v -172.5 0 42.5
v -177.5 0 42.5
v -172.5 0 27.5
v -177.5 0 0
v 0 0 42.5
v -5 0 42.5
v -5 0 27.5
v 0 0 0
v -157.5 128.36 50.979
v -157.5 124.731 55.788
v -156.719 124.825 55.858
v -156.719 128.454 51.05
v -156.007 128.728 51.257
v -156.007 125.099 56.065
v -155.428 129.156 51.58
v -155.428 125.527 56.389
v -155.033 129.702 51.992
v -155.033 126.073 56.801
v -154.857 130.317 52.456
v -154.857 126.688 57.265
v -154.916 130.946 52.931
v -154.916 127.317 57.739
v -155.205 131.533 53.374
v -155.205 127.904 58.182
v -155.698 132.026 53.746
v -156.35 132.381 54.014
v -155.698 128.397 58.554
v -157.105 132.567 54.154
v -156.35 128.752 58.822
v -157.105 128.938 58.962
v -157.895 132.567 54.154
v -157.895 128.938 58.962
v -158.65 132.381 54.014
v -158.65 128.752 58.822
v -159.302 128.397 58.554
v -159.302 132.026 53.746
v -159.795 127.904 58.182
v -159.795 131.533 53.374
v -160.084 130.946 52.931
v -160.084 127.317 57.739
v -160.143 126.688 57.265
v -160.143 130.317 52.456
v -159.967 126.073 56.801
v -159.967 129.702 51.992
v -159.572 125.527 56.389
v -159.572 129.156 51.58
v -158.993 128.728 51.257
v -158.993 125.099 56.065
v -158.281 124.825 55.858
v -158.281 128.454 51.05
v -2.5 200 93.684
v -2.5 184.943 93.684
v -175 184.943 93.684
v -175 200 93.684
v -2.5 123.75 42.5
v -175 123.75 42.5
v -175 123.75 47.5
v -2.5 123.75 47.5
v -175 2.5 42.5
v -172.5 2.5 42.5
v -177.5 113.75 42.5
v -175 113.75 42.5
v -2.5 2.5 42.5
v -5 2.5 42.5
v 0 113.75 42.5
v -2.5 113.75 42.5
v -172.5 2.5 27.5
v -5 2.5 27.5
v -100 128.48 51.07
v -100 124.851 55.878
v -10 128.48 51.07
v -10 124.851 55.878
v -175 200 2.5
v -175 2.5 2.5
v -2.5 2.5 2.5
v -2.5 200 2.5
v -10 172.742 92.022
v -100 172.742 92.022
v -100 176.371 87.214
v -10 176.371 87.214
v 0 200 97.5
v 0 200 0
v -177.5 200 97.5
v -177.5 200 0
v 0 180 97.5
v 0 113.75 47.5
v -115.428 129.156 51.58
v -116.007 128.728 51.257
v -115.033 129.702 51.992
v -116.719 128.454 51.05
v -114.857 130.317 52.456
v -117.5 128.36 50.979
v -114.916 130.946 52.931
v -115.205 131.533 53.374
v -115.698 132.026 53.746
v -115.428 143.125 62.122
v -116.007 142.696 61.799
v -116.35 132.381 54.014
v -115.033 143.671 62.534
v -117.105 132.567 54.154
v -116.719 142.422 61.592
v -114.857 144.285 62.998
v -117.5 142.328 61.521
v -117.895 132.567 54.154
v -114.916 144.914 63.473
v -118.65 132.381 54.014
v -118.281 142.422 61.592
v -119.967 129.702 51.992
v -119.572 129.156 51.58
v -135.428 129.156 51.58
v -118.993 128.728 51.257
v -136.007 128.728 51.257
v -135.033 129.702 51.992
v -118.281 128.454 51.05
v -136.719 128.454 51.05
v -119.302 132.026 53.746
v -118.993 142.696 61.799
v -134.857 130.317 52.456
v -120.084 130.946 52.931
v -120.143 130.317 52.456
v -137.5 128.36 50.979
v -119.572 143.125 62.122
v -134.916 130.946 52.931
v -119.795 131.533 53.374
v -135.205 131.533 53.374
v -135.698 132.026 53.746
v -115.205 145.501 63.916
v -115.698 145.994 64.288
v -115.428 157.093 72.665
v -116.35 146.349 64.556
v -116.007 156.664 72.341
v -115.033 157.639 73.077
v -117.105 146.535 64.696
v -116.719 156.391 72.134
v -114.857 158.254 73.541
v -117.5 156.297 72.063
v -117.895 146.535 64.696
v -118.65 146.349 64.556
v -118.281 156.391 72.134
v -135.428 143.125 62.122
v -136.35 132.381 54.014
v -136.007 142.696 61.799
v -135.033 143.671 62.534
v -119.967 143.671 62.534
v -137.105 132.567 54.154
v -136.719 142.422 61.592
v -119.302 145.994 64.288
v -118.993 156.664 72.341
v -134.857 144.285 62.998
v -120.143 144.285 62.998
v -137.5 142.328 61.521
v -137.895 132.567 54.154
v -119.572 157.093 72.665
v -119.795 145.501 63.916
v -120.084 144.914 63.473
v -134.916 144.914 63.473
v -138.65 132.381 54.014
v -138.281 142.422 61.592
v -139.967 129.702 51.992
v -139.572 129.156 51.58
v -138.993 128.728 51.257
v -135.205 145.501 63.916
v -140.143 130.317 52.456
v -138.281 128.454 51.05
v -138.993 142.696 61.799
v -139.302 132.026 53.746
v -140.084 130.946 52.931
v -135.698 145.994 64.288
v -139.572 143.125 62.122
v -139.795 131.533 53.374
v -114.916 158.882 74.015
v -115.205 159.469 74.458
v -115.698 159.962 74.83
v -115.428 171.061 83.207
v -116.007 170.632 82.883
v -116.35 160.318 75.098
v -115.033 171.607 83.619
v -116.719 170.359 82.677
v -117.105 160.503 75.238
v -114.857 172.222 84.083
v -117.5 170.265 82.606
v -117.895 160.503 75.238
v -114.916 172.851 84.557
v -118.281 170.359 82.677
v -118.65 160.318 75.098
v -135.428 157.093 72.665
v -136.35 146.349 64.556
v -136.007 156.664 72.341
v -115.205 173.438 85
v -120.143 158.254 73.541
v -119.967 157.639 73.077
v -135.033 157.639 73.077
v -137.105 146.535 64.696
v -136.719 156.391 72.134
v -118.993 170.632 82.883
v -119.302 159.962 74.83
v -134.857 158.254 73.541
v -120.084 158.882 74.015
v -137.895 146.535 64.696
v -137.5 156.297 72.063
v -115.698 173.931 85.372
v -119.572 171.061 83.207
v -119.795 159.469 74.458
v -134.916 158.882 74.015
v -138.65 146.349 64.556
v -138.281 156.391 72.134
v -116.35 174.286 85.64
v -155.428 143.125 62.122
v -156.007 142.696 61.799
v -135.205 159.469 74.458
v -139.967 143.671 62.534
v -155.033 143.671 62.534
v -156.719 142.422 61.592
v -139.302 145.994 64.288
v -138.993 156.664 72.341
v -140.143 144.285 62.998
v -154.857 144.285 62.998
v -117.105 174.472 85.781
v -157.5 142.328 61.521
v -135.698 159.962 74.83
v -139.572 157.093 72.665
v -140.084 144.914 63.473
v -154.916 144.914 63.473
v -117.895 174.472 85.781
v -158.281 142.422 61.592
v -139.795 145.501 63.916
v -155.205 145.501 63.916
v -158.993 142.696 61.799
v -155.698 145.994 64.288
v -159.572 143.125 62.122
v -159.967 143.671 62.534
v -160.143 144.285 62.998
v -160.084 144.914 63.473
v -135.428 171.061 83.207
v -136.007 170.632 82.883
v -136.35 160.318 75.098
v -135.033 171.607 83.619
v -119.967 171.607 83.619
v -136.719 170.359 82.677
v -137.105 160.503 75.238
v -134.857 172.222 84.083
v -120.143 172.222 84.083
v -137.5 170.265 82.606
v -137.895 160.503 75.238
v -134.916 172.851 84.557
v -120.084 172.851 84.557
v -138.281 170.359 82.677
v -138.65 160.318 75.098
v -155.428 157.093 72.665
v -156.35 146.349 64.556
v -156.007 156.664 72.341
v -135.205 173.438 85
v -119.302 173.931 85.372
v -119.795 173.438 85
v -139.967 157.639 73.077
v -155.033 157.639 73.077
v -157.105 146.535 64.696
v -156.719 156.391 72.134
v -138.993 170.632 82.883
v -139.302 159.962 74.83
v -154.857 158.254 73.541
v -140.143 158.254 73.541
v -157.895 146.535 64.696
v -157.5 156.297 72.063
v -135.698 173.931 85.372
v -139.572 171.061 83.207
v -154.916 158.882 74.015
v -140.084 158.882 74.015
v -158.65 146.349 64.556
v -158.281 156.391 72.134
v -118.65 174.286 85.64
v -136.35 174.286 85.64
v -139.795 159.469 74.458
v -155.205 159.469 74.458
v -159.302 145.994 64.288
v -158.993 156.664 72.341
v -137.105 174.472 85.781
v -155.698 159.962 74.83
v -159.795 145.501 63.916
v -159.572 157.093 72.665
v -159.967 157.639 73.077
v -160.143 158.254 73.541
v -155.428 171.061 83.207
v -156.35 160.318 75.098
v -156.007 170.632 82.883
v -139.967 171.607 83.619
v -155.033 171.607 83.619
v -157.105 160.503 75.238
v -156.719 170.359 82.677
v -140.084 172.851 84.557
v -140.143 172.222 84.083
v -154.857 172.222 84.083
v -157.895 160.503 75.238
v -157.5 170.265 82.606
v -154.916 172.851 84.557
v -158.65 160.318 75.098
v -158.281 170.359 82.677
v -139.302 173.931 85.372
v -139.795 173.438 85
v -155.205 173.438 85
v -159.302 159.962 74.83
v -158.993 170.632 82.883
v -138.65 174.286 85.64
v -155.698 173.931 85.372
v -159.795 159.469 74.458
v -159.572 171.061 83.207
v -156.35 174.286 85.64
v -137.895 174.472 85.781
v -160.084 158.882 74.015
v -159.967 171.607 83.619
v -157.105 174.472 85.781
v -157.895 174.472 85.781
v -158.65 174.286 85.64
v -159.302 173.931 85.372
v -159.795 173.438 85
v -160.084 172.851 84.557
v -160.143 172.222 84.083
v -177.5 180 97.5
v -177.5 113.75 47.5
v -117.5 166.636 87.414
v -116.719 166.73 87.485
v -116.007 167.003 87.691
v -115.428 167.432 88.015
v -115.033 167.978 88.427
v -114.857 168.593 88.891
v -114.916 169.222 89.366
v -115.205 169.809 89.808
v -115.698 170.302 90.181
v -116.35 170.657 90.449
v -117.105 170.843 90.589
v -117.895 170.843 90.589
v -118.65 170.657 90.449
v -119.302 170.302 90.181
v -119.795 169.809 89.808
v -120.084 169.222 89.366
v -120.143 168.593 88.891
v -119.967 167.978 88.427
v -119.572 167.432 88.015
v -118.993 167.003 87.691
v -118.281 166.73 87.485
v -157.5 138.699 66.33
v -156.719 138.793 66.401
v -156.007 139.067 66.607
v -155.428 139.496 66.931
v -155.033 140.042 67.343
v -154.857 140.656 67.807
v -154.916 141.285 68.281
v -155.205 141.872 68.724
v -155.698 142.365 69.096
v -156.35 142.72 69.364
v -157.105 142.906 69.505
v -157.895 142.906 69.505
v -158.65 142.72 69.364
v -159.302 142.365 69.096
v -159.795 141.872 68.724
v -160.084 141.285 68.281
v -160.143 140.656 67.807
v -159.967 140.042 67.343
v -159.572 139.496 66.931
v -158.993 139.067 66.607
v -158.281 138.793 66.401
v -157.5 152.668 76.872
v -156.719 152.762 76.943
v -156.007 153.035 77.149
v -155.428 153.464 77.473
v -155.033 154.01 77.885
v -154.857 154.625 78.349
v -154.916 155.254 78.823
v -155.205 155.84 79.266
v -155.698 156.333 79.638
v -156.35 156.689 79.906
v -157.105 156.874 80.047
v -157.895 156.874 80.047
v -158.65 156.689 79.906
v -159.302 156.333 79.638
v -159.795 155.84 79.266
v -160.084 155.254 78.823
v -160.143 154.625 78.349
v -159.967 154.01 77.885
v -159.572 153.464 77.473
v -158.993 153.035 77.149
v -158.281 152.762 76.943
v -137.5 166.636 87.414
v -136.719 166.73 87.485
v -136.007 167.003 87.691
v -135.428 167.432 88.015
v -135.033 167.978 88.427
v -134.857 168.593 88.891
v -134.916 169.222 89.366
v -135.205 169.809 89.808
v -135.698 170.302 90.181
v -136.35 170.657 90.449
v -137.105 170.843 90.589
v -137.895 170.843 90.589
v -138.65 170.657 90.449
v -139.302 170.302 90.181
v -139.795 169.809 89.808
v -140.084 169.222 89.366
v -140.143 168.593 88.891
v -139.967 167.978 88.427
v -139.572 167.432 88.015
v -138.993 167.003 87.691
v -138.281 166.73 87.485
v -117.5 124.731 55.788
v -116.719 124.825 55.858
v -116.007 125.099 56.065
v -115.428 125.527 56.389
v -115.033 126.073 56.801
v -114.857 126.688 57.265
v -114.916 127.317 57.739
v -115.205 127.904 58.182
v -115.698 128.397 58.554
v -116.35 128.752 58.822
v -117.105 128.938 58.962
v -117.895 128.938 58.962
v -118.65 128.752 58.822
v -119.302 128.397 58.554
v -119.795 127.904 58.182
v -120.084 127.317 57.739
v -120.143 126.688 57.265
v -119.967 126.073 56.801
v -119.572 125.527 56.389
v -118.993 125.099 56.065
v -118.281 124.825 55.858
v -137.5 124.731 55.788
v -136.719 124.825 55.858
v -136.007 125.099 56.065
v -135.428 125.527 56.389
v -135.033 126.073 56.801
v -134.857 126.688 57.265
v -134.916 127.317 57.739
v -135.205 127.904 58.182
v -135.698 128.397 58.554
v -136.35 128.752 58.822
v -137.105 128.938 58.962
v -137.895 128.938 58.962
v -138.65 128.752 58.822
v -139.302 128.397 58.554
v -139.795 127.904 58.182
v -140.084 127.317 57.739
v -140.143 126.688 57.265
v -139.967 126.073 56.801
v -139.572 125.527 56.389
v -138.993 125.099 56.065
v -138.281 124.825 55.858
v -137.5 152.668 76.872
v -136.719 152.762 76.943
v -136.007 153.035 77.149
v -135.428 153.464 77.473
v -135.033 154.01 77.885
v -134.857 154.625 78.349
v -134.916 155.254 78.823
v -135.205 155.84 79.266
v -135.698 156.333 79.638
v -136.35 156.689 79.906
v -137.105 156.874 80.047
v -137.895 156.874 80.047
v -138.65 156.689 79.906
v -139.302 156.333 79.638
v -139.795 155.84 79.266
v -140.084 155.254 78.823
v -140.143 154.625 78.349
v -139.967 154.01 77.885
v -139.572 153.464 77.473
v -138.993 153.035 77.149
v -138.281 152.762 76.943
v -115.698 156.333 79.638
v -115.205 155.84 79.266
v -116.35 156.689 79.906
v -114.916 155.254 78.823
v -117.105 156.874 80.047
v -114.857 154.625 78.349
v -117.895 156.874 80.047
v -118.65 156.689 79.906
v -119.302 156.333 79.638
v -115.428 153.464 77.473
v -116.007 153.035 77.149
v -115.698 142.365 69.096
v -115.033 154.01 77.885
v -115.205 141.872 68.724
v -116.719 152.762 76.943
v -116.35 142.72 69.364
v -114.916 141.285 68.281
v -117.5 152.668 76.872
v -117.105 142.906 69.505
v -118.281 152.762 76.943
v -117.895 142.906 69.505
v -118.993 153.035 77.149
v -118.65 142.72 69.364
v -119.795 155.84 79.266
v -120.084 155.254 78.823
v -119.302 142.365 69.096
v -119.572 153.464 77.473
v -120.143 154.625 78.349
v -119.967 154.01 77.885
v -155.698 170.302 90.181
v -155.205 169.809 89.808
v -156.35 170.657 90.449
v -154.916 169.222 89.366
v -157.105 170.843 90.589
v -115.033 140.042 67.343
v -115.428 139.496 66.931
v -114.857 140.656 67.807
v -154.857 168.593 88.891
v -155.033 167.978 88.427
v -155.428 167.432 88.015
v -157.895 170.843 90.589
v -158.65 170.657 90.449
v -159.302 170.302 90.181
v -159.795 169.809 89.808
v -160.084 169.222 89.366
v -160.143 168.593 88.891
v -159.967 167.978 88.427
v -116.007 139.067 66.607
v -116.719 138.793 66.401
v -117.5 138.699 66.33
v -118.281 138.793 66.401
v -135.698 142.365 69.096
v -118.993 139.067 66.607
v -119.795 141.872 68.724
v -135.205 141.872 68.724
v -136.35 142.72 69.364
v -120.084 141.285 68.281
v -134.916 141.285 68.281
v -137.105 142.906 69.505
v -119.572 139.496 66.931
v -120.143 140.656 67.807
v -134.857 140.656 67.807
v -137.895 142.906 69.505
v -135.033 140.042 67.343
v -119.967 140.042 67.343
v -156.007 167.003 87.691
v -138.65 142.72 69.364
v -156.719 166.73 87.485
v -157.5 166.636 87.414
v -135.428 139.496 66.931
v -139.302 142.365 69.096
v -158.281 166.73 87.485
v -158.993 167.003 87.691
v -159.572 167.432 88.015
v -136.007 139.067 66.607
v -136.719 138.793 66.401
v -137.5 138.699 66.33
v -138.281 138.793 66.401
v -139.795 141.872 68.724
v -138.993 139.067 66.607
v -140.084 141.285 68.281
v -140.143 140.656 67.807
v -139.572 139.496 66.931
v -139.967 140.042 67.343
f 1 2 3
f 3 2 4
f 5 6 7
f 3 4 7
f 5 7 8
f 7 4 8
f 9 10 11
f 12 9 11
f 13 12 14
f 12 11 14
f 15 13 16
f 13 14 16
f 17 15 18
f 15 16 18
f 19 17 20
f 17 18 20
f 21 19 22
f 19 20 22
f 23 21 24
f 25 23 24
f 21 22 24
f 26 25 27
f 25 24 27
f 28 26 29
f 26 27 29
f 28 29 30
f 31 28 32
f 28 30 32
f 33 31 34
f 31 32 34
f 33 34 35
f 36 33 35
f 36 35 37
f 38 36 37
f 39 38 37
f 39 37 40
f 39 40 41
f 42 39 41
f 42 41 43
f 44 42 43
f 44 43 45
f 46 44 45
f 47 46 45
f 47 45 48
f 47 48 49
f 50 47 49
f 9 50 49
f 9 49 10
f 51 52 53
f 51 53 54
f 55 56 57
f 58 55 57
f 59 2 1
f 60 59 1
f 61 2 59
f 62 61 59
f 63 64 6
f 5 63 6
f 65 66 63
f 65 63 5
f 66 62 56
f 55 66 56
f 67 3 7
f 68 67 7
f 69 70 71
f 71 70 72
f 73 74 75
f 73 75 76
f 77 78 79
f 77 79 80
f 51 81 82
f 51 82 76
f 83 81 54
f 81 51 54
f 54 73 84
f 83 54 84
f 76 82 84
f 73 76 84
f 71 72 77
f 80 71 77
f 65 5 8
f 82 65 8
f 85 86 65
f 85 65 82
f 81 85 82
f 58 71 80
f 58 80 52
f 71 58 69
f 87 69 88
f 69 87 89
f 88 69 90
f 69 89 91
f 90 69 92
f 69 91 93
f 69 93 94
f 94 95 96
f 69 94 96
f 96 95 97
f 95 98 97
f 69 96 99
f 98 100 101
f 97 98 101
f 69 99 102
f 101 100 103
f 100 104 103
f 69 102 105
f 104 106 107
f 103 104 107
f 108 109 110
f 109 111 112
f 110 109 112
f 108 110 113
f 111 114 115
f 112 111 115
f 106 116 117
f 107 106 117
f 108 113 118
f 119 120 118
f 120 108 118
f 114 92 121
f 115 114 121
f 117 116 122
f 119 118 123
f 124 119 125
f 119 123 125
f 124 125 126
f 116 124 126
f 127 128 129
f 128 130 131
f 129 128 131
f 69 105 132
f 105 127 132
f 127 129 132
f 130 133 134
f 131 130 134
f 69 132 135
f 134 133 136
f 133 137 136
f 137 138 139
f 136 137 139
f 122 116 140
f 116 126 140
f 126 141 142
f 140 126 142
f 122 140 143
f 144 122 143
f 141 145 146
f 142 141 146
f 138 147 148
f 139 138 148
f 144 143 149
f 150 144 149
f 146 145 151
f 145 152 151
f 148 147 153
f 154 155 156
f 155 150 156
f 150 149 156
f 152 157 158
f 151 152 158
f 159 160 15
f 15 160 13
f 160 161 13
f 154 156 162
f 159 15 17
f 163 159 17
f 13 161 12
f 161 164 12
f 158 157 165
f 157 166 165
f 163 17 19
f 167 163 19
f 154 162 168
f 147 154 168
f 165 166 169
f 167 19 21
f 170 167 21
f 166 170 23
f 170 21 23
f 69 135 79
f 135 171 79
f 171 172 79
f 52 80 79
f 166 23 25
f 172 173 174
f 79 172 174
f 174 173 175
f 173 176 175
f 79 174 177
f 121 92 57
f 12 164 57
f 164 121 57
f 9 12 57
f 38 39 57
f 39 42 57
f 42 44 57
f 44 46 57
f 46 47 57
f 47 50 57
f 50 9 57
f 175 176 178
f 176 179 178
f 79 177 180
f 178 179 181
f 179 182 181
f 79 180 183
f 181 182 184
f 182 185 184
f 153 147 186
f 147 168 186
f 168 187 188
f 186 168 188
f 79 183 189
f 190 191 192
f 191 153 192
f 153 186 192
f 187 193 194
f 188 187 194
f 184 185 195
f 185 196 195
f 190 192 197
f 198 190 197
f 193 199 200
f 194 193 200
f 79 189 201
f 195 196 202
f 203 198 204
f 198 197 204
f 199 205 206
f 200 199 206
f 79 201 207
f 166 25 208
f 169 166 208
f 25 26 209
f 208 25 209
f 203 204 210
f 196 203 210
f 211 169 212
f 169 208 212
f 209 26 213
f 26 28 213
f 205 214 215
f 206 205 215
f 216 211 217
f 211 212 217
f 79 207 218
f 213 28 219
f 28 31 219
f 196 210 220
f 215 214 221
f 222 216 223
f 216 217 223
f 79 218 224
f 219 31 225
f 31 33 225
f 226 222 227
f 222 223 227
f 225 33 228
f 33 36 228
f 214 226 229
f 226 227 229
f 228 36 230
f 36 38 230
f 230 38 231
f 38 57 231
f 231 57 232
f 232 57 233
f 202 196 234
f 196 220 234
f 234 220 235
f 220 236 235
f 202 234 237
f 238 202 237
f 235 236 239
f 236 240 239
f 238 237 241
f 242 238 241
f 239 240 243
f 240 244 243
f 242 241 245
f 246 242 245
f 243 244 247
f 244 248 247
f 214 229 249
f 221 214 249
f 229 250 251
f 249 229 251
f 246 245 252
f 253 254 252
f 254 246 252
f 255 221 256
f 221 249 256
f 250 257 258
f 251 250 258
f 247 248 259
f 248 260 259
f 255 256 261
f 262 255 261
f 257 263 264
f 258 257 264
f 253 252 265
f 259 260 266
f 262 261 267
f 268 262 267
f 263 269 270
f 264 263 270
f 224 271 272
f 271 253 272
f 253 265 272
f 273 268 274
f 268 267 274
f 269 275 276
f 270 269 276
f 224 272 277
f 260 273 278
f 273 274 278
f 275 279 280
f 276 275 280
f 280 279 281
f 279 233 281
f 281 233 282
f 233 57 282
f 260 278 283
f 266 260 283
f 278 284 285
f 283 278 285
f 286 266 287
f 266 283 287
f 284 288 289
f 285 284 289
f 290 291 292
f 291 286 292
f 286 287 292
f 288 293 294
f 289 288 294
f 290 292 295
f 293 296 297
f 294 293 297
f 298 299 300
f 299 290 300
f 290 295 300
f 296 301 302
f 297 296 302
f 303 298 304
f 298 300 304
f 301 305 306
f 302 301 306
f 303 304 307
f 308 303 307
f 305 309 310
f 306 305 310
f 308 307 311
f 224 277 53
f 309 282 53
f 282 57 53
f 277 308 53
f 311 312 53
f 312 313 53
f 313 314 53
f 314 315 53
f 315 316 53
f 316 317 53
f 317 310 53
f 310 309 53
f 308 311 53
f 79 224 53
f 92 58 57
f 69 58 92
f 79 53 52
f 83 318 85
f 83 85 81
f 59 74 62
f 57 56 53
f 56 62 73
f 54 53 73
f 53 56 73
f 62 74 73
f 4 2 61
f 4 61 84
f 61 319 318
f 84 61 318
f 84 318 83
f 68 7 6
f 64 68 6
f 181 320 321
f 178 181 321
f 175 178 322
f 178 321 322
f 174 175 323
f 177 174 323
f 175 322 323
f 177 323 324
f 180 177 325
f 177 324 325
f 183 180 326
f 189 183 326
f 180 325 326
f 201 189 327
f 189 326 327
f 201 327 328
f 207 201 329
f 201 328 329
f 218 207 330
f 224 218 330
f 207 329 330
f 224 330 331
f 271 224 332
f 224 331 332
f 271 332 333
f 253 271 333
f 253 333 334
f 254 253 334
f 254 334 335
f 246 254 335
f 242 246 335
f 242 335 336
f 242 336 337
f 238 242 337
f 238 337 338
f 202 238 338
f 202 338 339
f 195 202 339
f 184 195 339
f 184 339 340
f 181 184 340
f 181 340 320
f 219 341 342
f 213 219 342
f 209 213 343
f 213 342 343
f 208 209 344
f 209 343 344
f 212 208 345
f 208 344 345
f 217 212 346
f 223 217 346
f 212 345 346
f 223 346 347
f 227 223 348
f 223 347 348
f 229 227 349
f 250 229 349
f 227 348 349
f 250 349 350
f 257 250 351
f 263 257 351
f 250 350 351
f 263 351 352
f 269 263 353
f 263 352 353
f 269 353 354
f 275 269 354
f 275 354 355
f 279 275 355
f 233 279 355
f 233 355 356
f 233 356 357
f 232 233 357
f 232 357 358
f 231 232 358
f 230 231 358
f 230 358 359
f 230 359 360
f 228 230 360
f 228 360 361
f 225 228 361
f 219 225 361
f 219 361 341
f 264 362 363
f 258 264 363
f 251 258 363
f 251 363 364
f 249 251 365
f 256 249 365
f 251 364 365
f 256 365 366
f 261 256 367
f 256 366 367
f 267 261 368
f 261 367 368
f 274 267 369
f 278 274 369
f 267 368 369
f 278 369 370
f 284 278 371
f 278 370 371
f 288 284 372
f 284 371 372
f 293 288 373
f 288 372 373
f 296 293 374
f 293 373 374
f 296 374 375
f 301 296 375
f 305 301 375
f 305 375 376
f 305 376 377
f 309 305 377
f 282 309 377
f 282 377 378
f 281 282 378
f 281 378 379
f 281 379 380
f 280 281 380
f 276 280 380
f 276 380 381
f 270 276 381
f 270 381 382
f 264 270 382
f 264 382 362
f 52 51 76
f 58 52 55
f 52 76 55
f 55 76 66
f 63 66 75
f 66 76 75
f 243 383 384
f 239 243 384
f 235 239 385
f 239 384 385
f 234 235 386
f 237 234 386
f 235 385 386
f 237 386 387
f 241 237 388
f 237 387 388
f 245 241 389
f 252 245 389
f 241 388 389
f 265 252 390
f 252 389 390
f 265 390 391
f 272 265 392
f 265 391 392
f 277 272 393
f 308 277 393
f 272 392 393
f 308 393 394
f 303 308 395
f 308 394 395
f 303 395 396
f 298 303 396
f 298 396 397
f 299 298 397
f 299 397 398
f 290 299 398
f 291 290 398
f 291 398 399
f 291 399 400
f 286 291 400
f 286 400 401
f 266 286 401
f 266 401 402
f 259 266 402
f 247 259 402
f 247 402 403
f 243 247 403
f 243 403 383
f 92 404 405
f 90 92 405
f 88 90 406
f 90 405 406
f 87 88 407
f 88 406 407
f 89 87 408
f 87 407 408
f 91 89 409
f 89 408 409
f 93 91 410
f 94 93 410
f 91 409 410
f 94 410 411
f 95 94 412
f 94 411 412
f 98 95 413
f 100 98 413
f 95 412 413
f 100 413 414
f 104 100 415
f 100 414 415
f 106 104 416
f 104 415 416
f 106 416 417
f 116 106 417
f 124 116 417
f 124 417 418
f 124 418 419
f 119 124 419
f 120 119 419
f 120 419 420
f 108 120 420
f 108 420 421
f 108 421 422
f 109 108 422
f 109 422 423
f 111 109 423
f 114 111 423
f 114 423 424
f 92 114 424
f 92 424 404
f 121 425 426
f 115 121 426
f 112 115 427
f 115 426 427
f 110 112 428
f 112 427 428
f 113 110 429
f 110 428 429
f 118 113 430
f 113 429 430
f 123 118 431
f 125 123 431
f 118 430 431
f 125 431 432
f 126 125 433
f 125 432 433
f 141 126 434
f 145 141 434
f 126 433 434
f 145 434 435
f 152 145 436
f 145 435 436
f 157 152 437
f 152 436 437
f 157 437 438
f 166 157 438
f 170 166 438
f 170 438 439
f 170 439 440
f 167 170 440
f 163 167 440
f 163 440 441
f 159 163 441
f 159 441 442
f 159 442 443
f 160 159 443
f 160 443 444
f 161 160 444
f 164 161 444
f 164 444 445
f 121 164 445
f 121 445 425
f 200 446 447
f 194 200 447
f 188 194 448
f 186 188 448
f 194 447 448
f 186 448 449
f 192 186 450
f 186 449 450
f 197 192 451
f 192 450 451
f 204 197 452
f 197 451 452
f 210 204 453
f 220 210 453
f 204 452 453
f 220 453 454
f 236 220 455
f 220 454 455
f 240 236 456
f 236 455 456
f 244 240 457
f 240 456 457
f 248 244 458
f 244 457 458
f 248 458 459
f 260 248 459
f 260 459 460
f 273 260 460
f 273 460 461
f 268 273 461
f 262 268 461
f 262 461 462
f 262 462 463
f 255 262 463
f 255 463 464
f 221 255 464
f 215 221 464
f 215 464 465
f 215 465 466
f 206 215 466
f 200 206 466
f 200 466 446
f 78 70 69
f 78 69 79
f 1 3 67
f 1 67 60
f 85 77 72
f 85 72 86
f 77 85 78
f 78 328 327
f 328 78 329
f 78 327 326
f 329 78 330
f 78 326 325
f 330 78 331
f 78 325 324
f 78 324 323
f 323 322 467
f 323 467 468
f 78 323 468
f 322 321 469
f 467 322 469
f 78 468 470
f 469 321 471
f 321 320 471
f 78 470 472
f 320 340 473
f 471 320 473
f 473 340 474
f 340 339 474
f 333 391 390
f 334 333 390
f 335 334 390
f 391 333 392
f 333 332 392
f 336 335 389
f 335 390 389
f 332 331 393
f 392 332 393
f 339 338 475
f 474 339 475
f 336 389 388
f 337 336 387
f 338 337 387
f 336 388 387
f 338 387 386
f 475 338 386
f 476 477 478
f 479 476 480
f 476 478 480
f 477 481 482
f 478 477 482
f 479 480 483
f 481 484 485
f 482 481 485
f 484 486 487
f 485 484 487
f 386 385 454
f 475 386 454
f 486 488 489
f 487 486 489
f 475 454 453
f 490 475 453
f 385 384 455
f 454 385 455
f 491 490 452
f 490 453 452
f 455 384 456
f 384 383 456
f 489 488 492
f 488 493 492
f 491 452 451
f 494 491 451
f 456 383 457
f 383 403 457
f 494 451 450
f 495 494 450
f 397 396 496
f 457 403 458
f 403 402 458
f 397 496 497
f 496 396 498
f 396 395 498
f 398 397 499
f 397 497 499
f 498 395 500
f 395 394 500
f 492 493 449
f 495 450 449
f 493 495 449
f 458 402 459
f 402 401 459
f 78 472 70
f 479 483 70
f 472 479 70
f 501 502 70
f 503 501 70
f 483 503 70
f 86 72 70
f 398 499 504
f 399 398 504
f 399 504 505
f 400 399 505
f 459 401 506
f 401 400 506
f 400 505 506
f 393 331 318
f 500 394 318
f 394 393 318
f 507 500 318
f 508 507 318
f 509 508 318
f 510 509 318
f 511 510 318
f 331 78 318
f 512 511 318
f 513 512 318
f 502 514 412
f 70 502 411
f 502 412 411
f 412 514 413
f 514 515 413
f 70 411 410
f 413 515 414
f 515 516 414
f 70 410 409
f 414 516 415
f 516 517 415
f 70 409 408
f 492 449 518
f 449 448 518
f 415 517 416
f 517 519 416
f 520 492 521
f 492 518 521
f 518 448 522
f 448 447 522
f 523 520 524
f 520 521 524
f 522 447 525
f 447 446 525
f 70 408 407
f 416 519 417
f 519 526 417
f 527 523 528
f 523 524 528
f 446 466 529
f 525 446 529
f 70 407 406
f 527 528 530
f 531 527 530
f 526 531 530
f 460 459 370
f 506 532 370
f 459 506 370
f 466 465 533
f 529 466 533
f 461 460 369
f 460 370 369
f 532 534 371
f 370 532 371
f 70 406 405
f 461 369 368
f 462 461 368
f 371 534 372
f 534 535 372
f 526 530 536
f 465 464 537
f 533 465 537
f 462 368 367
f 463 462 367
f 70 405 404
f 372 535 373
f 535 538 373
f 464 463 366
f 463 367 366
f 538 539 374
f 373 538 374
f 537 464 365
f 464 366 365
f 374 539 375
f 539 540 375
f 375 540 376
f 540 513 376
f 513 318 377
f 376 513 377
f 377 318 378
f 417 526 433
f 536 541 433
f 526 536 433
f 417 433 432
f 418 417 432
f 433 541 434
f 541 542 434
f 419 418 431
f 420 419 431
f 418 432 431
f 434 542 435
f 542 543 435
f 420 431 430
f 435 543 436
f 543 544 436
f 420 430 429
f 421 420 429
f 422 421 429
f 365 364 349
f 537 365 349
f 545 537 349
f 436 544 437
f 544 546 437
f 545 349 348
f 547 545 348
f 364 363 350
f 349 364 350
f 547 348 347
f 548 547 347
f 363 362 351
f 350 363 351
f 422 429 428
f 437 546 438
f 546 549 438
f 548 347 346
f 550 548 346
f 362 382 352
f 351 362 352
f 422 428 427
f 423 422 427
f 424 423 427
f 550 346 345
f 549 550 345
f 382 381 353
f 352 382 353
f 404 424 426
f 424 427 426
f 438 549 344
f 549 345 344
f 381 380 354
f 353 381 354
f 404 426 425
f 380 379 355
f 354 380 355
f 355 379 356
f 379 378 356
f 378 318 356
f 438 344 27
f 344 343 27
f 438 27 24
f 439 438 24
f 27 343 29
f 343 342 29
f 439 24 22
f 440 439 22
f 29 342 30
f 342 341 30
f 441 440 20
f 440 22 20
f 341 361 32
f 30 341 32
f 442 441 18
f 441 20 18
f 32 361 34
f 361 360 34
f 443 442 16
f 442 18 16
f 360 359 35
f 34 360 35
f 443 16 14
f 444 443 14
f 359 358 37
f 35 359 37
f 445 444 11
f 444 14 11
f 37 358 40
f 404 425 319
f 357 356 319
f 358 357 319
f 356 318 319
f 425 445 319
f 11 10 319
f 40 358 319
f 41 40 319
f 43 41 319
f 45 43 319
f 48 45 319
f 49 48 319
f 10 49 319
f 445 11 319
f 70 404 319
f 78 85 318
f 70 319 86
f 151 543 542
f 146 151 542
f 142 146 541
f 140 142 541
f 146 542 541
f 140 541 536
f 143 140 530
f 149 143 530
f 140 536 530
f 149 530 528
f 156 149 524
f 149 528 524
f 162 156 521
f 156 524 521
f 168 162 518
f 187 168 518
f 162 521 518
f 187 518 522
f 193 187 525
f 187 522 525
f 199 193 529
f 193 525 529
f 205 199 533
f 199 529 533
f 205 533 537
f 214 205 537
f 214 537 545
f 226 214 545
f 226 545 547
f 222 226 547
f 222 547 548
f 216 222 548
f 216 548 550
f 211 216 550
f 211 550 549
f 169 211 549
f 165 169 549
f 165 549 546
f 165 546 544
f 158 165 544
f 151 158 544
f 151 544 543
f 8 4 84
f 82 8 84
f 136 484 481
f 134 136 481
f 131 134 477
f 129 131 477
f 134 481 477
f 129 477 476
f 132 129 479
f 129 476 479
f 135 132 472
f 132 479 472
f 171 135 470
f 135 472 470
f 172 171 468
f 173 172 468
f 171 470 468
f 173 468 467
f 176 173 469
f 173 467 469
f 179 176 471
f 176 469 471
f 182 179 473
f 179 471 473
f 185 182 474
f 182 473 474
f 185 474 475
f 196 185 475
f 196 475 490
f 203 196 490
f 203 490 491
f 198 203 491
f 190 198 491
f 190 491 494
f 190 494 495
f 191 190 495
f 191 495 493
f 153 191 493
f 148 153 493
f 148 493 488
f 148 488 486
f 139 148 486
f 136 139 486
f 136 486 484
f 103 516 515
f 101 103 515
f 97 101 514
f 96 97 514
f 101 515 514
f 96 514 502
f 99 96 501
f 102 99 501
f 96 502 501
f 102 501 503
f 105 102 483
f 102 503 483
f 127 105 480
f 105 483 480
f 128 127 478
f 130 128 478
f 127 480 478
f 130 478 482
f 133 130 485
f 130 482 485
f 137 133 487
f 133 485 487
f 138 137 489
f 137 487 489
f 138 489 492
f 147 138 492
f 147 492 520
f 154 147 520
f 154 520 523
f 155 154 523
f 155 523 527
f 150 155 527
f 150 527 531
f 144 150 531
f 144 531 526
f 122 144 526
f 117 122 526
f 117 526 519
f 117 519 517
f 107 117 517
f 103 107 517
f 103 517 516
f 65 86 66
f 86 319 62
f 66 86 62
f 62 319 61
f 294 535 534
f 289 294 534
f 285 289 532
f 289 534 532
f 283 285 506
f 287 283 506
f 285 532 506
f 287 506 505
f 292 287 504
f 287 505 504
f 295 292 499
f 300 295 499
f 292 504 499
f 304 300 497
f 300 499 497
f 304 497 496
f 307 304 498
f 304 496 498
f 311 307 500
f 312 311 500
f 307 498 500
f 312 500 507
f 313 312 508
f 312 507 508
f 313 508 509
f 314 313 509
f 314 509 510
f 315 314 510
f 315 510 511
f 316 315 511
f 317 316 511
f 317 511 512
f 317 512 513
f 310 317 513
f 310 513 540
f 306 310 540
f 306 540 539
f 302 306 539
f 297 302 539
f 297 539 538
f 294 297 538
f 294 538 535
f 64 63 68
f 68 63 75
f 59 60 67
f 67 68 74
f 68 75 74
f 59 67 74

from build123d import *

# Parameters (mm, degrees)
SKETCH1_W                 = 200
SKETCH1_H                 = 177.5
BOSS_EXTRUDE1_DEPTH       = 2.5
BOSS_EXTRUDE2_DEPTH       = 40
SKETCH5_W                 = 86.25
SKETCH5_H                 = 95
BOSS_EXTRUDE3_DEPTH       = 2.5
CUT_EXTRUDE1_DEPTH        = 285.62694883
CUT_EXTRUDE1_DEPTH_BACK   = 285.62694883
BOSS_EXTRUDE4_START       = -177.5
BOSS_EXTRUDE4_DEPTH       = 177.5
SKETCH9_W                 = 167.5
SKETCH9_H                 = 15
CUT_EXTRUDE2_DEPTH        = 285.62694883
SKETCH15_R                = 2.65
CUT_EXTRUDE5_DEPTH        = 10
LPATTERN1_COUNT           = 4
LPATTERN1_PITCH           = 17.5
LPATTERN2_COUNT           = 3
LPATTERN2_PITCH           = 20
LPATTERN2_COPY_1_SKETCH_R = 2.65
LPATTERN2_COPY_1_DEPTH    = 10
LPATTERN2_COPY_2_SKETCH_R = 2.65
LPATTERN2_COPY_2_DEPTH    = 10
LPATTERN2_COPY_3_SKETCH_R = 2.65
LPATTERN2_COPY_3_DEPTH    = 10
LPATTERN2_COPY_4_SKETCH_R = 2.65
LPATTERN2_COPY_4_DEPTH    = 10
LPATTERN2_COPY_5_SKETCH_R = 2.65
LPATTERN2_COPY_5_DEPTH    = 10
LPATTERN2_COPY_6_SKETCH_R = 2.65
LPATTERN2_COPY_6_DEPTH    = 10
SKETCH16_W                = 90
SKETCH16_H                = 60
CUT_EXTRUDE6_DEPTH        = 10


# Read off the part's stored shape, not the designer's step: Boss-Extrude2
with BuildPart() as part:
    # Sketch1 → Boss-Extrude1 (new body)
    with BuildSketch(Plane(origin=(0, 0, 0), x_dir=(0, 1, 0), z_dir=(0, 0, 1))):
        with Locations((100, 88.75)):
            Rectangle(SKETCH1_W, SKETCH1_H)
    extrude(amount=BOSS_EXTRUDE1_DEPTH)

    # Boss-Extrude2 outline → Boss-Extrude2 (add)
    with BuildSketch(Plane.XY.offset(2.5)):
        Polygon((-177.5, 143.75), (-177.5, 0), (0, 0), (0, 143.75), (-2.5, 143.75), (-2.5, 2.5), (-175, 2.5), (-175, 143.75), align=None)
    extrude(amount=BOSS_EXTRUDE2_DEPTH)

    # Sketch5 → Boss-Extrude3 (add)
    with BuildSketch(Plane.YZ):
        with Locations((156.875, 50)):
            Rectangle(SKETCH5_W, SKETCH5_H)
    boss_extrude3 = extrude(amount=-BOSS_EXTRUDE3_DEPTH)

    # Mirror2: Boss-Extrude3 across plane
    add(boss_extrude3.mirror(Plane(origin=(-88.75, 0, 0), x_dir=(0, 0, 1), z_dir=(1, 0, 0))))

    # Sketch6 → Cut-Extrude1 (cut, two sides: drawn at the far end of the back side and taken through both)
    with BuildSketch(Plane.YZ.offset(-CUT_EXTRUDE1_DEPTH_BACK)):
        Polygon((113.75, 97.5), (113.75, 42.5), (180, 97.5), align=None)
    extrude(amount=CUT_EXTRUDE1_DEPTH + CUT_EXTRUDE1_DEPTH_BACK, mode=Mode.SUBTRACT)

    # Sketch7 → Boss-Extrude4 (add)
    with BuildSketch(Plane.YZ.offset(BOSS_EXTRUDE4_START)):
        Polygon((113.75, 47.5), (113.75, 42.5), (123.75, 42.5), (123.75, 47.5), (184.943404756, 93.683701702), (200, 93.683701702), (200, 97.5), (180, 97.5), align=None)
    extrude(amount=BOSS_EXTRUDE4_DEPTH)

    # Sketch9 → Cut-Extrude2 (cut, through all)
    with BuildSketch(Plane.XZ):
        with Locations((-88.75, 35)):
            Rectangle(SKETCH9_W, SKETCH9_H)
    extrude(amount=-CUT_EXTRUDE2_DEPTH, mode=Mode.SUBTRACT)

    # Sketch15 → Cut-Extrude5 (cut)
    with BuildSketch(Plane(origin=(0, 18.439555455, -24.432410978), x_dir=(1, 0, 0), z_dir=(0, -0.6024069059118725, 0.7981891503332306))):
        with Locations(Location((-157.5, 188.315762576, 0), (0, 0, 270))):
            Circle(SKETCH15_R)
    cut_extrude5 = extrude(amount=-CUT_EXTRUDE5_DEPTH, mode=Mode.SUBTRACT)

    # LPattern1: Cut-Extrude5 ×4
    with Locations(*[Vector(0, -0.7981891503332306, -0.6024069059118724) * (i * LPATTERN1_PITCH) for i in range(1, LPATTERN1_COUNT)]):
        add(cut_extrude5, mode=Mode.SUBTRACT)

    # LPattern2: Cut-Extrude5 ×3
    with Locations(*[(i * LPATTERN2_PITCH, 0, 0) for i in range(1, LPATTERN2_COUNT)]):
        add(cut_extrude5, mode=Mode.SUBTRACT)

    # LPattern2 copy 1 sketch → LPattern2 copy 1 (cut)
    with BuildSketch(Plane(origin=(20, 4.471245324, -34.974531831), x_dir=(1, 0, 0), z_dir=(0, -0.6024069059118725, 0.7981891503332306))):
        with Locations(Location((-157.5, 188.315762576, 0), (0, 0, 270))):
            Circle(LPATTERN2_COPY_1_SKETCH_R)
    extrude(amount=-LPATTERN2_COPY_1_DEPTH, mode=Mode.SUBTRACT)

    # LPattern2 copy 2 sketch → LPattern2 copy 2 (cut)
    with BuildSketch(Plane(origin=(40, 4.471245324, -34.974531831), x_dir=(1, 0, 0), z_dir=(0, -0.6024069059118725, 0.7981891503332306))):
        with Locations(Location((-157.5, 188.315762576, 0), (0, 0, 270))):
            Circle(LPATTERN2_COPY_2_SKETCH_R)
    extrude(amount=-LPATTERN2_COPY_2_DEPTH, mode=Mode.SUBTRACT)

    # LPattern2 copy 3 sketch → LPattern2 copy 3 (cut)
    with BuildSketch(Plane(origin=(20, -9.497064807, -45.516652684), x_dir=(1, 0, 0), z_dir=(0, -0.6024069059118725, 0.7981891503332306))):
        with Locations(Location((-157.5, 188.315762576, 0), (0, 0, 270))):
            Circle(LPATTERN2_COPY_3_SKETCH_R)
    extrude(amount=-LPATTERN2_COPY_3_DEPTH, mode=Mode.SUBTRACT)

    # LPattern2 copy 4 sketch → LPattern2 copy 4 (cut)
    with BuildSketch(Plane(origin=(40, -9.497064807, -45.516652684), x_dir=(1, 0, 0), z_dir=(0, -0.6024069059118725, 0.7981891503332306))):
        with Locations(Location((-157.5, 188.315762576, 0), (0, 0, 270))):
            Circle(LPATTERN2_COPY_4_SKETCH_R)
    extrude(amount=-LPATTERN2_COPY_4_DEPTH, mode=Mode.SUBTRACT)

    # LPattern2 copy 5 sketch → LPattern2 copy 5 (cut)
    with BuildSketch(Plane(origin=(20, -23.465374938, -56.058773538), x_dir=(1, 0, 0), z_dir=(0, -0.6024069059118725, 0.7981891503332306))):
        with Locations(Location((-157.5, 188.315762576, 0), (0, 0, 270))):
            Circle(LPATTERN2_COPY_5_SKETCH_R)
    extrude(amount=-LPATTERN2_COPY_5_DEPTH, mode=Mode.SUBTRACT)

    # LPattern2 copy 6 sketch → LPattern2 copy 6 (cut)
    with BuildSketch(Plane(origin=(40, -23.465374938, -56.058773538), x_dir=(1, 0, 0), z_dir=(0, -0.6024069059118725, 0.7981891503332306))):
        with Locations(Location((-157.5, 188.315762576, 0), (0, 0, 270))):
            Circle(LPATTERN2_COPY_6_SKETCH_R)
    extrude(amount=-LPATTERN2_COPY_6_DEPTH, mode=Mode.SUBTRACT)

    # Sketch16 → Cut-Extrude6 (cut)
    with BuildSketch(Plane(origin=(0, 18.439555455, -24.432410978), x_dir=(1, 0, 0), z_dir=(0, -0.6024069059118724, 0.7981891503332307))):
        with Locations((-55, 163.315762576)):
            Rectangle(SKETCH16_W, SKETCH16_H)
    extrude(amount=-CUT_EXTRUDE6_DEPTH, mode=Mode.SUBTRACT)


solid = part.part
